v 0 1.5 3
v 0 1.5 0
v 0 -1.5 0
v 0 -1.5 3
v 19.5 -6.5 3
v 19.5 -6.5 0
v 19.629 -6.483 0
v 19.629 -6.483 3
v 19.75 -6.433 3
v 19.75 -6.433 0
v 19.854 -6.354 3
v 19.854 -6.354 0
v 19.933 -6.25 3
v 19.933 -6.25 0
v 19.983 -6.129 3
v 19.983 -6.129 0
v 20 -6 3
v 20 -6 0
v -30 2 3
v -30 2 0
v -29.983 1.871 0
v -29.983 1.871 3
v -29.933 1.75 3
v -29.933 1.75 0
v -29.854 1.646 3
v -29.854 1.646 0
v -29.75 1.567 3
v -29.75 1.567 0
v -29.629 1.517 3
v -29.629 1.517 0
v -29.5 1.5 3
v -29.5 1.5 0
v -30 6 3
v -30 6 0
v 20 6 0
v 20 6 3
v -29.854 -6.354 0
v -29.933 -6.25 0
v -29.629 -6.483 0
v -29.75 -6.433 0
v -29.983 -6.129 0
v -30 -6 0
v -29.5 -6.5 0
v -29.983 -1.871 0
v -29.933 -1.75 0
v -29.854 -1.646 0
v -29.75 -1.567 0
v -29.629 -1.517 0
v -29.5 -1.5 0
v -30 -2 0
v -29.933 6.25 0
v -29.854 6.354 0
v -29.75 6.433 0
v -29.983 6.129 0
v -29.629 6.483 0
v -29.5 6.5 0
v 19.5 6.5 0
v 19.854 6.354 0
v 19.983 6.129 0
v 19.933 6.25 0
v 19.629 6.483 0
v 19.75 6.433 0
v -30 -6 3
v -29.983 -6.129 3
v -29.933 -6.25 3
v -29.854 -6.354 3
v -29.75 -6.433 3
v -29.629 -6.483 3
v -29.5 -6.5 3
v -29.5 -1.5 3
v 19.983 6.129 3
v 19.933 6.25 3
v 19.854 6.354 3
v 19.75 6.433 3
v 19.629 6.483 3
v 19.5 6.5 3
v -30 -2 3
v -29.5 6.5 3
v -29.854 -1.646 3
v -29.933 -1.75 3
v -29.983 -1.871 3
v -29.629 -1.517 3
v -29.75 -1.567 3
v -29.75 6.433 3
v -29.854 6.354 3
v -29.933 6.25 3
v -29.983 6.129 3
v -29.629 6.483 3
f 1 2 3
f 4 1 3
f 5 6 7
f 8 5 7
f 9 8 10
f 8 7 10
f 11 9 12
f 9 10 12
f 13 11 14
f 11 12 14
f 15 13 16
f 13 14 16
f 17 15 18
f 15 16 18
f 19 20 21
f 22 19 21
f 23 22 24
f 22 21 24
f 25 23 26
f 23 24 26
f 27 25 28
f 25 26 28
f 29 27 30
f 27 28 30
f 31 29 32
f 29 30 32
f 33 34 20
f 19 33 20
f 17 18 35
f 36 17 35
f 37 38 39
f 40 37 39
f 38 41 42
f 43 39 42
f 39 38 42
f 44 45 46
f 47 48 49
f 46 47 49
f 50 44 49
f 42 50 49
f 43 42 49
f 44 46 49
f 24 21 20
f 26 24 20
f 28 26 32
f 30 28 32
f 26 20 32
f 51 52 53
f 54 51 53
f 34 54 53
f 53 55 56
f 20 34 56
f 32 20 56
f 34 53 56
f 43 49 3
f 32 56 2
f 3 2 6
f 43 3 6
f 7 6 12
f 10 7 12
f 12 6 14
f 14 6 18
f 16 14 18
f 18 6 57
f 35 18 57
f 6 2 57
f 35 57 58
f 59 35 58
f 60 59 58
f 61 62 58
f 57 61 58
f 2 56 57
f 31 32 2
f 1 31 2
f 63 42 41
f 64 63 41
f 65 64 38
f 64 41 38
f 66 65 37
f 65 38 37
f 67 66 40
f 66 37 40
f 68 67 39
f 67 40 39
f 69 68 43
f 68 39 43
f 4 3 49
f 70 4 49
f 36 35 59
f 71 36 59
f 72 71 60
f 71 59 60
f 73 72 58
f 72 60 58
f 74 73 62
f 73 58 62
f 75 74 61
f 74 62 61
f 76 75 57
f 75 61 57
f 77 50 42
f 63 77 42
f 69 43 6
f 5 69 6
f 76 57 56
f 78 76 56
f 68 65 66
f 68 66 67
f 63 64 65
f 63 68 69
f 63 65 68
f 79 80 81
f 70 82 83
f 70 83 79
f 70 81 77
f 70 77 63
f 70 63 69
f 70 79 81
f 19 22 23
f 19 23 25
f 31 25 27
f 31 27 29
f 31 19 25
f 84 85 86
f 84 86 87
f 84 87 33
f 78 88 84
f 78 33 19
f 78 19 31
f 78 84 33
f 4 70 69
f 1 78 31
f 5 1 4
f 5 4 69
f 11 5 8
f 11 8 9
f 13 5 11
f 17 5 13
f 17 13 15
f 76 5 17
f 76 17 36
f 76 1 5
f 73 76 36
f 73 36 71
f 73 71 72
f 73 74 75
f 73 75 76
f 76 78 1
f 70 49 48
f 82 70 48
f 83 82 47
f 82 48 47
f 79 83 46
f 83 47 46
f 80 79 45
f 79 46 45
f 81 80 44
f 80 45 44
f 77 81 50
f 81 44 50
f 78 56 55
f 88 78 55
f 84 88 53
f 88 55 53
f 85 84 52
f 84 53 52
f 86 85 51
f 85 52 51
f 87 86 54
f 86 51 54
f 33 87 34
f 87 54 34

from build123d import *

# Parameters (mm, degrees)
SALIENTE_EXTRUIR1_DEPTH = 3


with BuildPart() as part:
    # Croquis1 → Saliente-Extruir1 (new body)
    with BuildSketch(Plane.XY):
        with BuildLine():
            Line((-29.5, 1.5), (0, 1.5))
            Line((0, 1.5), (0, -1.5))
            Line((0, -1.5), (-29.5, -1.5))
            ThreePointArc((-29.5, -1.5), (-29.853553391, -1.646446609), (-30, -2))
            Line((-30, -2), (-30, -6))
            ThreePointArc((-30, -6), (-29.853553391, -6.353553391), (-29.5, -6.5))
            Line((-29.5, -6.5), (19.5, -6.5))
            ThreePointArc((19.5, -6.5), (19.853553391, -6.353553391), (20, -6))
            Line((20, -6), (20, 0))
            Line((20, 0), (20, 6))
            ThreePointArc((20, 6), (19.853553391, 6.353553391), (19.5, 6.5))
            Line((19.5, 6.5), (-29.5, 6.5))
            ThreePointArc((-29.5, 6.5), (-29.853553391, 6.353553391), (-30, 6))
            Line((-30, 6), (-30, 2))
            ThreePointArc((-30, 2), (-29.853553391, 1.646446609), (-29.5, 1.5))
        make_face()
    extrude(amount=SALIENTE_EXTRUIR1_DEPTH)


solid = part.part
